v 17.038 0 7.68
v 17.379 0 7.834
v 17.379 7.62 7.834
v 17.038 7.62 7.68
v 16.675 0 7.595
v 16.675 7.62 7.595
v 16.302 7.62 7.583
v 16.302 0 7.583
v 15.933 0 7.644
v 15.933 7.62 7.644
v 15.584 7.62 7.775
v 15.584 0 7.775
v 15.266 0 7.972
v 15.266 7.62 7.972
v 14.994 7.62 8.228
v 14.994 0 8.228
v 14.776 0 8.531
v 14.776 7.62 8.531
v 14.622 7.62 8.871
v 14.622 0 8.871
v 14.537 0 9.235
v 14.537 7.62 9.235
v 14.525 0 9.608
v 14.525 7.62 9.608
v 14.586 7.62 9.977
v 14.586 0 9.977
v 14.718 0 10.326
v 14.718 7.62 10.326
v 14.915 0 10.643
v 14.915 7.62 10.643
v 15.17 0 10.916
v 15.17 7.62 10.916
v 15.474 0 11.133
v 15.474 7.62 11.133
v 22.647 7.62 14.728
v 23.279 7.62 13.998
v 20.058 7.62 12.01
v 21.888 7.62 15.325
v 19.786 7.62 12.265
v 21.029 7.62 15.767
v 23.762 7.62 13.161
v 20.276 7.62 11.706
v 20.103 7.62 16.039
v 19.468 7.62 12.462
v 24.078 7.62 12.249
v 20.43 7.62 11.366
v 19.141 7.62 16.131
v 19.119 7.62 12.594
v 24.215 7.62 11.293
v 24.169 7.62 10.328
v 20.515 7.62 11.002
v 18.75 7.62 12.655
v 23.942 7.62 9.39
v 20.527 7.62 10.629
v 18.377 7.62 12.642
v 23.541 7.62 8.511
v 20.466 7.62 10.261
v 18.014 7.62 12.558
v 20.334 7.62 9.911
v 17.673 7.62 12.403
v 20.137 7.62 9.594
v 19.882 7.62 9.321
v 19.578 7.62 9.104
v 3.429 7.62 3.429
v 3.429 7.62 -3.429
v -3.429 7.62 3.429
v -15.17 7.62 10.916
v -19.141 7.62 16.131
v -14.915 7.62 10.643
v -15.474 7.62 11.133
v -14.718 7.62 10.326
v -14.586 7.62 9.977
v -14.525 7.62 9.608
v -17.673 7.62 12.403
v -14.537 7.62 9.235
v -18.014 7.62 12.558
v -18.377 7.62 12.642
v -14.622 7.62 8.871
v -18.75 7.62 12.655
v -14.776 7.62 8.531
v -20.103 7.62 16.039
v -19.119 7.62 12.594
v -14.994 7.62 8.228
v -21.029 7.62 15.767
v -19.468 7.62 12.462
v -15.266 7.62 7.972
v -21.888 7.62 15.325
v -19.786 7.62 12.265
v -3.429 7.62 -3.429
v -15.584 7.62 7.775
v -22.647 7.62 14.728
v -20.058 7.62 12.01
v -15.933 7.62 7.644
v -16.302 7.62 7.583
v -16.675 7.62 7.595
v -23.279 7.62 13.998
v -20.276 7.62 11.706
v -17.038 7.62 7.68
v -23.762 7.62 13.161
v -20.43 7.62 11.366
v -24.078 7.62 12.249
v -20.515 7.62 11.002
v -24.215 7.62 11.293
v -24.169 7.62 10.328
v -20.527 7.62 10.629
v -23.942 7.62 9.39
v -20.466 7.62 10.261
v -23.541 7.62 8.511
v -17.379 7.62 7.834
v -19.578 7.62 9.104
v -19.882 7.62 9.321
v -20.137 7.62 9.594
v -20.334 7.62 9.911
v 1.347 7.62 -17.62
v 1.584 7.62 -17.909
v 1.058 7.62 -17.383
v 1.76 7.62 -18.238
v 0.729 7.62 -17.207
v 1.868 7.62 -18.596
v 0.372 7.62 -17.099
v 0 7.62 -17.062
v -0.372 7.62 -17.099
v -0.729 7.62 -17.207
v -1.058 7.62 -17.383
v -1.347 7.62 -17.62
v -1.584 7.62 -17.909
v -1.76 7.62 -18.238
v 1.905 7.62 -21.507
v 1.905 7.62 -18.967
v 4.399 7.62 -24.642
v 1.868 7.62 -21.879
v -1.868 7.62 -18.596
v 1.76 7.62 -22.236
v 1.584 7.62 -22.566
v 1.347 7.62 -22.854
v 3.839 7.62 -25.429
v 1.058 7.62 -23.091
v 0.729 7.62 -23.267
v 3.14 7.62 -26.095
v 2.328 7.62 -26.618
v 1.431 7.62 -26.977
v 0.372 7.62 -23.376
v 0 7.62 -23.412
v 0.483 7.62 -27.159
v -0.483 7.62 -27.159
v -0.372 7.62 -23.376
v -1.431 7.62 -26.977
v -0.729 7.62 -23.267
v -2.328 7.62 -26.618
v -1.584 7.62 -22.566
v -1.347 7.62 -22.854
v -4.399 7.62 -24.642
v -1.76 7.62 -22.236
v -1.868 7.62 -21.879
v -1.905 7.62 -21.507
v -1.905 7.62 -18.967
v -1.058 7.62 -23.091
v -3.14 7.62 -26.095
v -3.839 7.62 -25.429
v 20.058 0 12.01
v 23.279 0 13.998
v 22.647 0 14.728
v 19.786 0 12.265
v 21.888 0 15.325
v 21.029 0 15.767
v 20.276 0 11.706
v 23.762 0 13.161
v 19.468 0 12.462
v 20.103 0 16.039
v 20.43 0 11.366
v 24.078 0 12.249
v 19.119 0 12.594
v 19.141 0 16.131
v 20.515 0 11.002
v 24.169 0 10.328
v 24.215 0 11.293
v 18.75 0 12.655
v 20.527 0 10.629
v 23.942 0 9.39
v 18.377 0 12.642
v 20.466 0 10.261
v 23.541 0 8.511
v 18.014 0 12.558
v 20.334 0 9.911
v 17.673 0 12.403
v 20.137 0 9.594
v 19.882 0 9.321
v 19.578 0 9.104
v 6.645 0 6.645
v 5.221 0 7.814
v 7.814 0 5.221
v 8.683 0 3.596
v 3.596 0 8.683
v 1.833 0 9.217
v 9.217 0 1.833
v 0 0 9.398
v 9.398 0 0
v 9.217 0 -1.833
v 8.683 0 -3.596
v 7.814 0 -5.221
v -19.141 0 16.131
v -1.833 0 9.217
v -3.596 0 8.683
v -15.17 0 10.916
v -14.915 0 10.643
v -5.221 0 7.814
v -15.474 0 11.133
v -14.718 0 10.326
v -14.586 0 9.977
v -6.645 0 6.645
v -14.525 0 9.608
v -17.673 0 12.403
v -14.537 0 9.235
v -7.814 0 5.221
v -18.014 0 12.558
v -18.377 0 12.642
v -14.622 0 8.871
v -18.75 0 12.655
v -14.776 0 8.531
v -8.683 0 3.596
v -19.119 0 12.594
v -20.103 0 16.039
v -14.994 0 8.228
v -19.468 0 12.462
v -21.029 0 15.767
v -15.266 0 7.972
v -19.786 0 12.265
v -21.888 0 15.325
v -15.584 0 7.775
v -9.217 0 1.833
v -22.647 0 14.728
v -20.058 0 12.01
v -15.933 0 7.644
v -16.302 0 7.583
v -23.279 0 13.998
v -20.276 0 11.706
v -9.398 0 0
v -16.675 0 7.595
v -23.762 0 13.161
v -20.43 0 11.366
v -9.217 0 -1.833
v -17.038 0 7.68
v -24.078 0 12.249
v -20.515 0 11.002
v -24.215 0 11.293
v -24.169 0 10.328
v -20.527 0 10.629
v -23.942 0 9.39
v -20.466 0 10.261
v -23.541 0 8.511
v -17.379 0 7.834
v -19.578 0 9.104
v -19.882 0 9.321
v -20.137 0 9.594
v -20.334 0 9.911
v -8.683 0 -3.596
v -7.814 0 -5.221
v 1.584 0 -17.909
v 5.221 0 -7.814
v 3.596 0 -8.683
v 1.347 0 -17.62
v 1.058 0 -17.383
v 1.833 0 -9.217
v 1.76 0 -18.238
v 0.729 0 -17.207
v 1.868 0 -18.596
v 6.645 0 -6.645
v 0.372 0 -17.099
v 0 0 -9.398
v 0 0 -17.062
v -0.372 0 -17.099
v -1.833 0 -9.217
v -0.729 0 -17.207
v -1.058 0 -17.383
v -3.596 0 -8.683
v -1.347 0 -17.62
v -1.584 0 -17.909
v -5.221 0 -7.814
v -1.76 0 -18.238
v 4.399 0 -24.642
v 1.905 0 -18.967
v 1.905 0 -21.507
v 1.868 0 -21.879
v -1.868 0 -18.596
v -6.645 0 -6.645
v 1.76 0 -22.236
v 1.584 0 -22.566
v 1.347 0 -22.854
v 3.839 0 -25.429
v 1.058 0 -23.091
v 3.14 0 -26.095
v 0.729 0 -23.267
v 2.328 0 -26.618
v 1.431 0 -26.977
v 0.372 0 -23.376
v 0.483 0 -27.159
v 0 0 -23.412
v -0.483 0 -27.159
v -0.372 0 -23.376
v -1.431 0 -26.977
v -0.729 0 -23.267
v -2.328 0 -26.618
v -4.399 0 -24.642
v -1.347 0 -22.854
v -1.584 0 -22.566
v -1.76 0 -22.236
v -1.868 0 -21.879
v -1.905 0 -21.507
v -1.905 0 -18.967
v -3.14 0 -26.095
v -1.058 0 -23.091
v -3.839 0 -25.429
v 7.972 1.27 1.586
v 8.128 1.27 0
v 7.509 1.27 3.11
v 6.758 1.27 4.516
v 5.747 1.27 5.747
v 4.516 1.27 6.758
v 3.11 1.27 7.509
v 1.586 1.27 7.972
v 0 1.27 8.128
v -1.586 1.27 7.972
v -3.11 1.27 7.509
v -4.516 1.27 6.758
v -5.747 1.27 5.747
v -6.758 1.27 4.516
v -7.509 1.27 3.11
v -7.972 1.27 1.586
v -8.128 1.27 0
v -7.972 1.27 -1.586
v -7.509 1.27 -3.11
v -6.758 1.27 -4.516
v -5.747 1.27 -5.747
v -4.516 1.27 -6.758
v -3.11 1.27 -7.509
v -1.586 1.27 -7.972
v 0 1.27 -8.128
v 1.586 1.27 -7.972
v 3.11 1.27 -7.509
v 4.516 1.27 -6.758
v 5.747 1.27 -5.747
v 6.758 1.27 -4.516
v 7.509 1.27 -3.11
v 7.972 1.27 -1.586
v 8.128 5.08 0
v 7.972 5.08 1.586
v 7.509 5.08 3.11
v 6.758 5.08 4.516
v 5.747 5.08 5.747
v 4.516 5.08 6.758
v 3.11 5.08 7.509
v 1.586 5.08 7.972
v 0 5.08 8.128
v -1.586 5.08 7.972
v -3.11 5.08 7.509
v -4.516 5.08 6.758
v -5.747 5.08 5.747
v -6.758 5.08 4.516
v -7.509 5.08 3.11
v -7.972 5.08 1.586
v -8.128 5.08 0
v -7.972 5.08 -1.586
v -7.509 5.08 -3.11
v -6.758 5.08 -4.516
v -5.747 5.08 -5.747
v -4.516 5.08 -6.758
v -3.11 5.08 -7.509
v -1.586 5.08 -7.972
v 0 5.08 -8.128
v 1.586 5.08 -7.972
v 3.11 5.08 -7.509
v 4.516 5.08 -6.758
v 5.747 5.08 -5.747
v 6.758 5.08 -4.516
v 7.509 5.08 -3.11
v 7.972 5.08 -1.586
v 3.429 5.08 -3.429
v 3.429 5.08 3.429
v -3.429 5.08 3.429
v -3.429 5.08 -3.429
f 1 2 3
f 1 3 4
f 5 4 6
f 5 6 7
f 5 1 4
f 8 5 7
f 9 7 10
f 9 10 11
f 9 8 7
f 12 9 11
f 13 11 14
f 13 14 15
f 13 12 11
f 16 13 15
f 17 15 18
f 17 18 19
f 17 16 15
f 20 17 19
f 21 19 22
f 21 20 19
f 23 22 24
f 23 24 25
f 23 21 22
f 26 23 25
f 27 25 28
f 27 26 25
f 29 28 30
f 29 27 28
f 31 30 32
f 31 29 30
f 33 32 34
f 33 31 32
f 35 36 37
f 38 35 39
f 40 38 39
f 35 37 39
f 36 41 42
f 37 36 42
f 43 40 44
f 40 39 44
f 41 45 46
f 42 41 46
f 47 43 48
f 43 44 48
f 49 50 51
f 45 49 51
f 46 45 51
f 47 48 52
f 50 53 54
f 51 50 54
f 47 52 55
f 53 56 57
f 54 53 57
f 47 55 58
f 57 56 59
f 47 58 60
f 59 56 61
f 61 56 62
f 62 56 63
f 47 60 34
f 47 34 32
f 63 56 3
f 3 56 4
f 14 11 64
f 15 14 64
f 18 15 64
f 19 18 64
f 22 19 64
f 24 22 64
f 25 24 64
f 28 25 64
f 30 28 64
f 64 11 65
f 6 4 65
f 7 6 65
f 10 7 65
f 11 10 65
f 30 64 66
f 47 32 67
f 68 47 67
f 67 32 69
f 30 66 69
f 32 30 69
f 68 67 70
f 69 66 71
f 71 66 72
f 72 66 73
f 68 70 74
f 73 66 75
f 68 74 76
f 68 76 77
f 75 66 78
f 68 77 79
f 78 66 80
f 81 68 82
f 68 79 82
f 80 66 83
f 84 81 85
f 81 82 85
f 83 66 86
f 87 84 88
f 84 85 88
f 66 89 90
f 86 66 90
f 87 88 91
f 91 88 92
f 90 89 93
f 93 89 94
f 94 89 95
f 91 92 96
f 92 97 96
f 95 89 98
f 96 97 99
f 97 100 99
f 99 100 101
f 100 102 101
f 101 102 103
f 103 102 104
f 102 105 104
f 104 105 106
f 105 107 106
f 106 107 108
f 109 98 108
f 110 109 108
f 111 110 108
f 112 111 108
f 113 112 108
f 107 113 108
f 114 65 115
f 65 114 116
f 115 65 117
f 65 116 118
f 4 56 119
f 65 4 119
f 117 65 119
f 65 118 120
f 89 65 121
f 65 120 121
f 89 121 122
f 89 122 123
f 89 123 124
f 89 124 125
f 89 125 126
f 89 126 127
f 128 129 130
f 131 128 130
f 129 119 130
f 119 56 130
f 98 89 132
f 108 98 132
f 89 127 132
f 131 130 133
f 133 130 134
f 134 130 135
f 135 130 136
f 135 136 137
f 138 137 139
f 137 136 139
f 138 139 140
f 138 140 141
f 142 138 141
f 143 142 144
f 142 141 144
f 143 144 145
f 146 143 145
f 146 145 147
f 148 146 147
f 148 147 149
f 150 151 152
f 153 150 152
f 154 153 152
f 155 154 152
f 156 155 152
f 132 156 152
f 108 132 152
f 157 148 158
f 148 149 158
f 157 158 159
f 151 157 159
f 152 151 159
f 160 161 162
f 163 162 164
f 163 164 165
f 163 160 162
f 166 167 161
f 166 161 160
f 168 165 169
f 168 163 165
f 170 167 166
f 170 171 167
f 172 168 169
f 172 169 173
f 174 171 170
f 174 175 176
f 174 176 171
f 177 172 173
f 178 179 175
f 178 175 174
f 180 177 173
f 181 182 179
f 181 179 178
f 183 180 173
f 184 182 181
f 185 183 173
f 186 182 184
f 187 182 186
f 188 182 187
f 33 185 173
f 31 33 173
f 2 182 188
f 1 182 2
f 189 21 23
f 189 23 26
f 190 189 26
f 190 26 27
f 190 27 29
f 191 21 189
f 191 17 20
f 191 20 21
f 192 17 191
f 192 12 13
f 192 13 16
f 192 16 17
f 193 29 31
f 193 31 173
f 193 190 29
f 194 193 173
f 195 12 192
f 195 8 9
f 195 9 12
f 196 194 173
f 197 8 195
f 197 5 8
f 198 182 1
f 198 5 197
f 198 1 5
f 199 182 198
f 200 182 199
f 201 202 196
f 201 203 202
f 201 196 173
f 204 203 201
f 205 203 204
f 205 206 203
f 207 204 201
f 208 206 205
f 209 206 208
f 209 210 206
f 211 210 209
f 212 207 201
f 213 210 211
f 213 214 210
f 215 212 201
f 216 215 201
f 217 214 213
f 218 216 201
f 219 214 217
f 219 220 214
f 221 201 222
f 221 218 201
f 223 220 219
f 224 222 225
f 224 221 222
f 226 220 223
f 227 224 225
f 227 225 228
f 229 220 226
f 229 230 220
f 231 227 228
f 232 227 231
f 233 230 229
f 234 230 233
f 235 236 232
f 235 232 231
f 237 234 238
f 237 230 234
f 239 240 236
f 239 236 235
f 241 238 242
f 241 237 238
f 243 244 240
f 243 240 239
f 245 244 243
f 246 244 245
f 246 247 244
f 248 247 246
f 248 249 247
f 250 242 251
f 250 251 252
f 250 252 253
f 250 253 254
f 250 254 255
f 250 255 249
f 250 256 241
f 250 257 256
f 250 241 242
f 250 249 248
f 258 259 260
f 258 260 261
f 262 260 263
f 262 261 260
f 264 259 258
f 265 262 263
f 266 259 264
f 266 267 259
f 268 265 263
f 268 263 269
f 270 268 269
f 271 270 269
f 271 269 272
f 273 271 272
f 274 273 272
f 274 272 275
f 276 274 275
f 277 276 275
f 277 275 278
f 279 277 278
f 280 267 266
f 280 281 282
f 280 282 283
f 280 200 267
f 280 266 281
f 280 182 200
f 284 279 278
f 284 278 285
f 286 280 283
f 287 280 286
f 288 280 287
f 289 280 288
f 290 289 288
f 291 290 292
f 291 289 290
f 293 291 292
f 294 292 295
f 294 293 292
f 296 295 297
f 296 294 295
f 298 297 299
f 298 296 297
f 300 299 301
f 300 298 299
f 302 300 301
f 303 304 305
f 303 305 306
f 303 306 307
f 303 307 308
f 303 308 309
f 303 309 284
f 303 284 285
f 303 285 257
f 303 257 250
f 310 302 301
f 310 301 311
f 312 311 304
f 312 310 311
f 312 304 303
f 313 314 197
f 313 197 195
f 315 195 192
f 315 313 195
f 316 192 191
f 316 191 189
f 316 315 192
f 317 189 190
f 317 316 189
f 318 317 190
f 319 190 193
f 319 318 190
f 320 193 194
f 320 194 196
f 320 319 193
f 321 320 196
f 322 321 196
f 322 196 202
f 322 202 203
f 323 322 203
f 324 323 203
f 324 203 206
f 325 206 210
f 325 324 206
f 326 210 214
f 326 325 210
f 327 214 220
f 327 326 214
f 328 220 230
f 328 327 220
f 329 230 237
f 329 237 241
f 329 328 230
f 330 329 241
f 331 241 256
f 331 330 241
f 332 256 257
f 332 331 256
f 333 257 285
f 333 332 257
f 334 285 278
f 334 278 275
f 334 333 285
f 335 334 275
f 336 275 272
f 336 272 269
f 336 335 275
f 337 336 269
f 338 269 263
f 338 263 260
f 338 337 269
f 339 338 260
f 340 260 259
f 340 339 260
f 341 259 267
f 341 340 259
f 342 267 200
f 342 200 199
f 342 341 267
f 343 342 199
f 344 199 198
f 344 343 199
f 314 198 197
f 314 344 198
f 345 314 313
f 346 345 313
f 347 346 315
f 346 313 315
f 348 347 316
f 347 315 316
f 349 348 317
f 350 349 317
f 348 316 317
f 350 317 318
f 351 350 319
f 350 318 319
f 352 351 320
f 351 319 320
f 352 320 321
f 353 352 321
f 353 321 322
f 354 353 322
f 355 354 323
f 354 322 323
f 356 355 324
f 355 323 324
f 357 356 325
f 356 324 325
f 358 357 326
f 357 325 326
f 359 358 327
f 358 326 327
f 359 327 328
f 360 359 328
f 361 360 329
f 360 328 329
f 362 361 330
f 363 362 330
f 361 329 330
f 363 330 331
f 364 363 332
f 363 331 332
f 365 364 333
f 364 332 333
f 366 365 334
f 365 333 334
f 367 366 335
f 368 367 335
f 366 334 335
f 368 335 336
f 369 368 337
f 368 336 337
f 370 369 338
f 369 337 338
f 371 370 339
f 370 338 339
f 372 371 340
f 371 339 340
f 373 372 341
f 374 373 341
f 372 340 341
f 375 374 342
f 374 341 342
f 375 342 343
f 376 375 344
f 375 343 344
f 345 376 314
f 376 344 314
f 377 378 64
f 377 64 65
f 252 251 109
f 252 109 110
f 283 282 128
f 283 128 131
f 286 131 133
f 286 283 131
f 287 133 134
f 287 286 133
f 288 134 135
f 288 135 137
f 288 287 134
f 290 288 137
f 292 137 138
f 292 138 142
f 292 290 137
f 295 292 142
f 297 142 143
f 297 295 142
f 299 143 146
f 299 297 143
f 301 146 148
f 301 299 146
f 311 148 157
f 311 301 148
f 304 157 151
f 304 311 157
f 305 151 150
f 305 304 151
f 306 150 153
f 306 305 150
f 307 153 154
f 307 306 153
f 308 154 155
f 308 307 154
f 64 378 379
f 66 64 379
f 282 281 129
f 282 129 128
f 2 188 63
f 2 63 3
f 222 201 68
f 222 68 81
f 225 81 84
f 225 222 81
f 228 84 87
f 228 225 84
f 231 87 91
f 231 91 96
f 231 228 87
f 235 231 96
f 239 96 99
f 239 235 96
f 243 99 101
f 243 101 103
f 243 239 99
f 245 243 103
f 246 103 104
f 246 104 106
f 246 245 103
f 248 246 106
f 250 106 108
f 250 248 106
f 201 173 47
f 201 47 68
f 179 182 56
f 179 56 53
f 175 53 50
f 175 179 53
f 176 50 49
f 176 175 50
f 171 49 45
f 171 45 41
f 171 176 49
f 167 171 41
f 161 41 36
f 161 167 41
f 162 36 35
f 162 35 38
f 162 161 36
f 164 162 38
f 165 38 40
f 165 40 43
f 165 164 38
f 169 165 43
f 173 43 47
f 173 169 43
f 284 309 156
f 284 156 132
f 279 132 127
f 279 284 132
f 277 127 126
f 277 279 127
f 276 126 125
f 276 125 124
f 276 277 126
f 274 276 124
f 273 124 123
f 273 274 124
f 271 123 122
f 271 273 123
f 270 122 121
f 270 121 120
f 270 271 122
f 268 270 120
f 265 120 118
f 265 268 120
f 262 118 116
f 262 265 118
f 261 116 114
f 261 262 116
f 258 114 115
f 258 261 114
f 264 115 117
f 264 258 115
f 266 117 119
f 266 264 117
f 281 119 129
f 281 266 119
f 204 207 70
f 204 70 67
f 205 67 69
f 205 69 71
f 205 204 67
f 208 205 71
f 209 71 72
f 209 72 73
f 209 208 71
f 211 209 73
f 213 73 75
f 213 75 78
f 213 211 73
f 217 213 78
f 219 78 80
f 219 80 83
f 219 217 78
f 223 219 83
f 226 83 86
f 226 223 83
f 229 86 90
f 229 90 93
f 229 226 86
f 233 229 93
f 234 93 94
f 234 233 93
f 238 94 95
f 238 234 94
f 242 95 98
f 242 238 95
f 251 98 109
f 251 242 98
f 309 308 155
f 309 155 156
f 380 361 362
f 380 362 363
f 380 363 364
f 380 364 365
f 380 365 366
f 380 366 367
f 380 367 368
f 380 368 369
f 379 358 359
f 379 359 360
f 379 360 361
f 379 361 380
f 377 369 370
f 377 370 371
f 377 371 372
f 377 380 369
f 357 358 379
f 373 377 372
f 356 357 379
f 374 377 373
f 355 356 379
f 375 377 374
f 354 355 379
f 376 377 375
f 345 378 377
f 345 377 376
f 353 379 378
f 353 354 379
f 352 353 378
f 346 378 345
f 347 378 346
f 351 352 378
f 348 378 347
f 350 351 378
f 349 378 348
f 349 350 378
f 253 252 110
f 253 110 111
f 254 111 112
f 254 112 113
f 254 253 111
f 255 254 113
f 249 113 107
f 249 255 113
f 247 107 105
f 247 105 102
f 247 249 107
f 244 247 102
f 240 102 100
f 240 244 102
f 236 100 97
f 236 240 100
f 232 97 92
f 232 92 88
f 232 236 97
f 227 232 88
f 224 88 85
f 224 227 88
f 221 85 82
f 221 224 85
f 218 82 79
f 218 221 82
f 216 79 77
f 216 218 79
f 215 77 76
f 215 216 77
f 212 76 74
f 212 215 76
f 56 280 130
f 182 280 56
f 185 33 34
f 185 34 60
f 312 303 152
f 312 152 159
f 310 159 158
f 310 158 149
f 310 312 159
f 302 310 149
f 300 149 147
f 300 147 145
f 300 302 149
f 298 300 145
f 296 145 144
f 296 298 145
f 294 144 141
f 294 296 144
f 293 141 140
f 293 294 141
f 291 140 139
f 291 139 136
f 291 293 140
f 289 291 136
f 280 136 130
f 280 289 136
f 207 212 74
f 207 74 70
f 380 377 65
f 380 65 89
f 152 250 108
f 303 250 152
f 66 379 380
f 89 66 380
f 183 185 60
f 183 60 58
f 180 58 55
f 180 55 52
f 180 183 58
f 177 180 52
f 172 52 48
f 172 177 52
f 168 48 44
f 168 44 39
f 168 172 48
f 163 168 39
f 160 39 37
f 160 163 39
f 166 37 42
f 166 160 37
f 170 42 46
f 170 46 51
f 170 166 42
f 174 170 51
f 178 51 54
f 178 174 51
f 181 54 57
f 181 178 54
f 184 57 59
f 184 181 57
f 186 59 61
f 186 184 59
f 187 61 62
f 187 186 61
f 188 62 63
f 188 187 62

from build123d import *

# Parameters (mm, degrees)
SKETCH1_R           = 3.175
BOSS_EXTRUDE1_DEPTH = 7.62
SKETCH2_R           = 8.128
CUT_EXTRUDE1_DEPTH  = 5.08
SKETCH3_W           = 6.858
SKETCH3_H           = 6.858
CUT_EXTRUDE2_DEPTH  = 8.62
CHAMFER1_SIZE       = 1.27


with BuildPart() as part:
    # Sketch1 → Boss-Extrude1 (new body)
    with BuildSketch(Plane(origin=(0, 0, 0), x_dir=(1, 0, 0), z_dir=(0, 1, 0))):
        with BuildLine():
            ThreePointArc((-4.399409051, 24.642333042), (0, 27.182333042), (4.399409051, 24.642333042))
            Line((4.399409051, 24.642333042), (23.540590949, -8.511166521))
            ThreePointArc((23.540590949, -8.511166521), (23.540590949, -13.591166521), (19.141181898, -16.131166521))
            Line((19.141181898, -16.131166521), (-19.141181898, -16.131166521))
            ThreePointArc((-19.141181898, -16.131166521), (-23.540590949, -13.591166521), (-23.540590949, -8.511166521))
            Line((-23.540590949, -8.511166521), (-4.399409051, 24.642333042))
        make_face()
        Circle(SKETCH1_R, mode=Mode.SUBTRACT)
        with BuildLine():
            ThreePointArc((17.673352263, -12.403419212), (20.275630657, -11.706140818), (19.578352263, -9.103862424))
            Line((19.578352263, -9.103862424), (17.378647737, -7.833862424))
            ThreePointArc((17.378647737, -7.833862424), (14.776369343, -8.531140818), (15.473647737, -11.133419212))
            Line((15.473647737, -11.133419212), (17.673352263, -12.403419212))
        make_face(mode=Mode.SUBTRACT)
        with BuildLine():
            ThreePointArc((-15.473647737, -11.133419212), (-14.776369343, -8.531140818), (-17.378647737, -7.833862424))
            Line((-17.378647737, -7.833862424), (-19.578352263, -9.103862424))
            ThreePointArc((-19.578352263, -9.103862424), (-20.275630657, -11.706140818), (-17.673352263, -12.403419212))
            Line((-17.673352263, -12.403419212), (-15.473647737, -11.133419212))
        make_face(mode=Mode.SUBTRACT)
        with BuildLine():
            ThreePointArc((1.905, 21.507281636), (0, 23.412281636), (-1.905, 21.507281636))
            Line((-1.905, 21.507281636), (-1.905, 18.967281636))
            ThreePointArc((-1.905, 18.967281636), (0, 17.062281636), (1.905, 18.967281636))
            Line((1.905, 18.967281636), (1.905, 21.507281636))
        make_face(mode=Mode.SUBTRACT)
    extrude(amount=BOSS_EXTRUDE1_DEPTH)

    # Sketch2 → Cut-Extrude1 (cut)
    with BuildSketch(Plane.XZ):
        Circle(SKETCH2_R)
    extrude(amount=-CUT_EXTRUDE1_DEPTH, mode=Mode.SUBTRACT)

    # Sketch3 → Cut-Extrude2 (cut, through all)
    with BuildSketch(Plane(origin=(0, 0, 0), x_dir=(-1, 0, 0), z_dir=(0, -1, 0))):
        Rectangle(SKETCH3_W, SKETCH3_H)
    extrude(amount=-CUT_EXTRUDE2_DEPTH, mode=Mode.SUBTRACT)

    # Chamfer1
    chamfer1_edges = [part.edges().sort_by_distance(p)[0] for p in [
        (-8.128, 0, 0),
    ]]
    chamfer(chamfer1_edges, length=CHAMFER1_SIZE)


solid = part.part
